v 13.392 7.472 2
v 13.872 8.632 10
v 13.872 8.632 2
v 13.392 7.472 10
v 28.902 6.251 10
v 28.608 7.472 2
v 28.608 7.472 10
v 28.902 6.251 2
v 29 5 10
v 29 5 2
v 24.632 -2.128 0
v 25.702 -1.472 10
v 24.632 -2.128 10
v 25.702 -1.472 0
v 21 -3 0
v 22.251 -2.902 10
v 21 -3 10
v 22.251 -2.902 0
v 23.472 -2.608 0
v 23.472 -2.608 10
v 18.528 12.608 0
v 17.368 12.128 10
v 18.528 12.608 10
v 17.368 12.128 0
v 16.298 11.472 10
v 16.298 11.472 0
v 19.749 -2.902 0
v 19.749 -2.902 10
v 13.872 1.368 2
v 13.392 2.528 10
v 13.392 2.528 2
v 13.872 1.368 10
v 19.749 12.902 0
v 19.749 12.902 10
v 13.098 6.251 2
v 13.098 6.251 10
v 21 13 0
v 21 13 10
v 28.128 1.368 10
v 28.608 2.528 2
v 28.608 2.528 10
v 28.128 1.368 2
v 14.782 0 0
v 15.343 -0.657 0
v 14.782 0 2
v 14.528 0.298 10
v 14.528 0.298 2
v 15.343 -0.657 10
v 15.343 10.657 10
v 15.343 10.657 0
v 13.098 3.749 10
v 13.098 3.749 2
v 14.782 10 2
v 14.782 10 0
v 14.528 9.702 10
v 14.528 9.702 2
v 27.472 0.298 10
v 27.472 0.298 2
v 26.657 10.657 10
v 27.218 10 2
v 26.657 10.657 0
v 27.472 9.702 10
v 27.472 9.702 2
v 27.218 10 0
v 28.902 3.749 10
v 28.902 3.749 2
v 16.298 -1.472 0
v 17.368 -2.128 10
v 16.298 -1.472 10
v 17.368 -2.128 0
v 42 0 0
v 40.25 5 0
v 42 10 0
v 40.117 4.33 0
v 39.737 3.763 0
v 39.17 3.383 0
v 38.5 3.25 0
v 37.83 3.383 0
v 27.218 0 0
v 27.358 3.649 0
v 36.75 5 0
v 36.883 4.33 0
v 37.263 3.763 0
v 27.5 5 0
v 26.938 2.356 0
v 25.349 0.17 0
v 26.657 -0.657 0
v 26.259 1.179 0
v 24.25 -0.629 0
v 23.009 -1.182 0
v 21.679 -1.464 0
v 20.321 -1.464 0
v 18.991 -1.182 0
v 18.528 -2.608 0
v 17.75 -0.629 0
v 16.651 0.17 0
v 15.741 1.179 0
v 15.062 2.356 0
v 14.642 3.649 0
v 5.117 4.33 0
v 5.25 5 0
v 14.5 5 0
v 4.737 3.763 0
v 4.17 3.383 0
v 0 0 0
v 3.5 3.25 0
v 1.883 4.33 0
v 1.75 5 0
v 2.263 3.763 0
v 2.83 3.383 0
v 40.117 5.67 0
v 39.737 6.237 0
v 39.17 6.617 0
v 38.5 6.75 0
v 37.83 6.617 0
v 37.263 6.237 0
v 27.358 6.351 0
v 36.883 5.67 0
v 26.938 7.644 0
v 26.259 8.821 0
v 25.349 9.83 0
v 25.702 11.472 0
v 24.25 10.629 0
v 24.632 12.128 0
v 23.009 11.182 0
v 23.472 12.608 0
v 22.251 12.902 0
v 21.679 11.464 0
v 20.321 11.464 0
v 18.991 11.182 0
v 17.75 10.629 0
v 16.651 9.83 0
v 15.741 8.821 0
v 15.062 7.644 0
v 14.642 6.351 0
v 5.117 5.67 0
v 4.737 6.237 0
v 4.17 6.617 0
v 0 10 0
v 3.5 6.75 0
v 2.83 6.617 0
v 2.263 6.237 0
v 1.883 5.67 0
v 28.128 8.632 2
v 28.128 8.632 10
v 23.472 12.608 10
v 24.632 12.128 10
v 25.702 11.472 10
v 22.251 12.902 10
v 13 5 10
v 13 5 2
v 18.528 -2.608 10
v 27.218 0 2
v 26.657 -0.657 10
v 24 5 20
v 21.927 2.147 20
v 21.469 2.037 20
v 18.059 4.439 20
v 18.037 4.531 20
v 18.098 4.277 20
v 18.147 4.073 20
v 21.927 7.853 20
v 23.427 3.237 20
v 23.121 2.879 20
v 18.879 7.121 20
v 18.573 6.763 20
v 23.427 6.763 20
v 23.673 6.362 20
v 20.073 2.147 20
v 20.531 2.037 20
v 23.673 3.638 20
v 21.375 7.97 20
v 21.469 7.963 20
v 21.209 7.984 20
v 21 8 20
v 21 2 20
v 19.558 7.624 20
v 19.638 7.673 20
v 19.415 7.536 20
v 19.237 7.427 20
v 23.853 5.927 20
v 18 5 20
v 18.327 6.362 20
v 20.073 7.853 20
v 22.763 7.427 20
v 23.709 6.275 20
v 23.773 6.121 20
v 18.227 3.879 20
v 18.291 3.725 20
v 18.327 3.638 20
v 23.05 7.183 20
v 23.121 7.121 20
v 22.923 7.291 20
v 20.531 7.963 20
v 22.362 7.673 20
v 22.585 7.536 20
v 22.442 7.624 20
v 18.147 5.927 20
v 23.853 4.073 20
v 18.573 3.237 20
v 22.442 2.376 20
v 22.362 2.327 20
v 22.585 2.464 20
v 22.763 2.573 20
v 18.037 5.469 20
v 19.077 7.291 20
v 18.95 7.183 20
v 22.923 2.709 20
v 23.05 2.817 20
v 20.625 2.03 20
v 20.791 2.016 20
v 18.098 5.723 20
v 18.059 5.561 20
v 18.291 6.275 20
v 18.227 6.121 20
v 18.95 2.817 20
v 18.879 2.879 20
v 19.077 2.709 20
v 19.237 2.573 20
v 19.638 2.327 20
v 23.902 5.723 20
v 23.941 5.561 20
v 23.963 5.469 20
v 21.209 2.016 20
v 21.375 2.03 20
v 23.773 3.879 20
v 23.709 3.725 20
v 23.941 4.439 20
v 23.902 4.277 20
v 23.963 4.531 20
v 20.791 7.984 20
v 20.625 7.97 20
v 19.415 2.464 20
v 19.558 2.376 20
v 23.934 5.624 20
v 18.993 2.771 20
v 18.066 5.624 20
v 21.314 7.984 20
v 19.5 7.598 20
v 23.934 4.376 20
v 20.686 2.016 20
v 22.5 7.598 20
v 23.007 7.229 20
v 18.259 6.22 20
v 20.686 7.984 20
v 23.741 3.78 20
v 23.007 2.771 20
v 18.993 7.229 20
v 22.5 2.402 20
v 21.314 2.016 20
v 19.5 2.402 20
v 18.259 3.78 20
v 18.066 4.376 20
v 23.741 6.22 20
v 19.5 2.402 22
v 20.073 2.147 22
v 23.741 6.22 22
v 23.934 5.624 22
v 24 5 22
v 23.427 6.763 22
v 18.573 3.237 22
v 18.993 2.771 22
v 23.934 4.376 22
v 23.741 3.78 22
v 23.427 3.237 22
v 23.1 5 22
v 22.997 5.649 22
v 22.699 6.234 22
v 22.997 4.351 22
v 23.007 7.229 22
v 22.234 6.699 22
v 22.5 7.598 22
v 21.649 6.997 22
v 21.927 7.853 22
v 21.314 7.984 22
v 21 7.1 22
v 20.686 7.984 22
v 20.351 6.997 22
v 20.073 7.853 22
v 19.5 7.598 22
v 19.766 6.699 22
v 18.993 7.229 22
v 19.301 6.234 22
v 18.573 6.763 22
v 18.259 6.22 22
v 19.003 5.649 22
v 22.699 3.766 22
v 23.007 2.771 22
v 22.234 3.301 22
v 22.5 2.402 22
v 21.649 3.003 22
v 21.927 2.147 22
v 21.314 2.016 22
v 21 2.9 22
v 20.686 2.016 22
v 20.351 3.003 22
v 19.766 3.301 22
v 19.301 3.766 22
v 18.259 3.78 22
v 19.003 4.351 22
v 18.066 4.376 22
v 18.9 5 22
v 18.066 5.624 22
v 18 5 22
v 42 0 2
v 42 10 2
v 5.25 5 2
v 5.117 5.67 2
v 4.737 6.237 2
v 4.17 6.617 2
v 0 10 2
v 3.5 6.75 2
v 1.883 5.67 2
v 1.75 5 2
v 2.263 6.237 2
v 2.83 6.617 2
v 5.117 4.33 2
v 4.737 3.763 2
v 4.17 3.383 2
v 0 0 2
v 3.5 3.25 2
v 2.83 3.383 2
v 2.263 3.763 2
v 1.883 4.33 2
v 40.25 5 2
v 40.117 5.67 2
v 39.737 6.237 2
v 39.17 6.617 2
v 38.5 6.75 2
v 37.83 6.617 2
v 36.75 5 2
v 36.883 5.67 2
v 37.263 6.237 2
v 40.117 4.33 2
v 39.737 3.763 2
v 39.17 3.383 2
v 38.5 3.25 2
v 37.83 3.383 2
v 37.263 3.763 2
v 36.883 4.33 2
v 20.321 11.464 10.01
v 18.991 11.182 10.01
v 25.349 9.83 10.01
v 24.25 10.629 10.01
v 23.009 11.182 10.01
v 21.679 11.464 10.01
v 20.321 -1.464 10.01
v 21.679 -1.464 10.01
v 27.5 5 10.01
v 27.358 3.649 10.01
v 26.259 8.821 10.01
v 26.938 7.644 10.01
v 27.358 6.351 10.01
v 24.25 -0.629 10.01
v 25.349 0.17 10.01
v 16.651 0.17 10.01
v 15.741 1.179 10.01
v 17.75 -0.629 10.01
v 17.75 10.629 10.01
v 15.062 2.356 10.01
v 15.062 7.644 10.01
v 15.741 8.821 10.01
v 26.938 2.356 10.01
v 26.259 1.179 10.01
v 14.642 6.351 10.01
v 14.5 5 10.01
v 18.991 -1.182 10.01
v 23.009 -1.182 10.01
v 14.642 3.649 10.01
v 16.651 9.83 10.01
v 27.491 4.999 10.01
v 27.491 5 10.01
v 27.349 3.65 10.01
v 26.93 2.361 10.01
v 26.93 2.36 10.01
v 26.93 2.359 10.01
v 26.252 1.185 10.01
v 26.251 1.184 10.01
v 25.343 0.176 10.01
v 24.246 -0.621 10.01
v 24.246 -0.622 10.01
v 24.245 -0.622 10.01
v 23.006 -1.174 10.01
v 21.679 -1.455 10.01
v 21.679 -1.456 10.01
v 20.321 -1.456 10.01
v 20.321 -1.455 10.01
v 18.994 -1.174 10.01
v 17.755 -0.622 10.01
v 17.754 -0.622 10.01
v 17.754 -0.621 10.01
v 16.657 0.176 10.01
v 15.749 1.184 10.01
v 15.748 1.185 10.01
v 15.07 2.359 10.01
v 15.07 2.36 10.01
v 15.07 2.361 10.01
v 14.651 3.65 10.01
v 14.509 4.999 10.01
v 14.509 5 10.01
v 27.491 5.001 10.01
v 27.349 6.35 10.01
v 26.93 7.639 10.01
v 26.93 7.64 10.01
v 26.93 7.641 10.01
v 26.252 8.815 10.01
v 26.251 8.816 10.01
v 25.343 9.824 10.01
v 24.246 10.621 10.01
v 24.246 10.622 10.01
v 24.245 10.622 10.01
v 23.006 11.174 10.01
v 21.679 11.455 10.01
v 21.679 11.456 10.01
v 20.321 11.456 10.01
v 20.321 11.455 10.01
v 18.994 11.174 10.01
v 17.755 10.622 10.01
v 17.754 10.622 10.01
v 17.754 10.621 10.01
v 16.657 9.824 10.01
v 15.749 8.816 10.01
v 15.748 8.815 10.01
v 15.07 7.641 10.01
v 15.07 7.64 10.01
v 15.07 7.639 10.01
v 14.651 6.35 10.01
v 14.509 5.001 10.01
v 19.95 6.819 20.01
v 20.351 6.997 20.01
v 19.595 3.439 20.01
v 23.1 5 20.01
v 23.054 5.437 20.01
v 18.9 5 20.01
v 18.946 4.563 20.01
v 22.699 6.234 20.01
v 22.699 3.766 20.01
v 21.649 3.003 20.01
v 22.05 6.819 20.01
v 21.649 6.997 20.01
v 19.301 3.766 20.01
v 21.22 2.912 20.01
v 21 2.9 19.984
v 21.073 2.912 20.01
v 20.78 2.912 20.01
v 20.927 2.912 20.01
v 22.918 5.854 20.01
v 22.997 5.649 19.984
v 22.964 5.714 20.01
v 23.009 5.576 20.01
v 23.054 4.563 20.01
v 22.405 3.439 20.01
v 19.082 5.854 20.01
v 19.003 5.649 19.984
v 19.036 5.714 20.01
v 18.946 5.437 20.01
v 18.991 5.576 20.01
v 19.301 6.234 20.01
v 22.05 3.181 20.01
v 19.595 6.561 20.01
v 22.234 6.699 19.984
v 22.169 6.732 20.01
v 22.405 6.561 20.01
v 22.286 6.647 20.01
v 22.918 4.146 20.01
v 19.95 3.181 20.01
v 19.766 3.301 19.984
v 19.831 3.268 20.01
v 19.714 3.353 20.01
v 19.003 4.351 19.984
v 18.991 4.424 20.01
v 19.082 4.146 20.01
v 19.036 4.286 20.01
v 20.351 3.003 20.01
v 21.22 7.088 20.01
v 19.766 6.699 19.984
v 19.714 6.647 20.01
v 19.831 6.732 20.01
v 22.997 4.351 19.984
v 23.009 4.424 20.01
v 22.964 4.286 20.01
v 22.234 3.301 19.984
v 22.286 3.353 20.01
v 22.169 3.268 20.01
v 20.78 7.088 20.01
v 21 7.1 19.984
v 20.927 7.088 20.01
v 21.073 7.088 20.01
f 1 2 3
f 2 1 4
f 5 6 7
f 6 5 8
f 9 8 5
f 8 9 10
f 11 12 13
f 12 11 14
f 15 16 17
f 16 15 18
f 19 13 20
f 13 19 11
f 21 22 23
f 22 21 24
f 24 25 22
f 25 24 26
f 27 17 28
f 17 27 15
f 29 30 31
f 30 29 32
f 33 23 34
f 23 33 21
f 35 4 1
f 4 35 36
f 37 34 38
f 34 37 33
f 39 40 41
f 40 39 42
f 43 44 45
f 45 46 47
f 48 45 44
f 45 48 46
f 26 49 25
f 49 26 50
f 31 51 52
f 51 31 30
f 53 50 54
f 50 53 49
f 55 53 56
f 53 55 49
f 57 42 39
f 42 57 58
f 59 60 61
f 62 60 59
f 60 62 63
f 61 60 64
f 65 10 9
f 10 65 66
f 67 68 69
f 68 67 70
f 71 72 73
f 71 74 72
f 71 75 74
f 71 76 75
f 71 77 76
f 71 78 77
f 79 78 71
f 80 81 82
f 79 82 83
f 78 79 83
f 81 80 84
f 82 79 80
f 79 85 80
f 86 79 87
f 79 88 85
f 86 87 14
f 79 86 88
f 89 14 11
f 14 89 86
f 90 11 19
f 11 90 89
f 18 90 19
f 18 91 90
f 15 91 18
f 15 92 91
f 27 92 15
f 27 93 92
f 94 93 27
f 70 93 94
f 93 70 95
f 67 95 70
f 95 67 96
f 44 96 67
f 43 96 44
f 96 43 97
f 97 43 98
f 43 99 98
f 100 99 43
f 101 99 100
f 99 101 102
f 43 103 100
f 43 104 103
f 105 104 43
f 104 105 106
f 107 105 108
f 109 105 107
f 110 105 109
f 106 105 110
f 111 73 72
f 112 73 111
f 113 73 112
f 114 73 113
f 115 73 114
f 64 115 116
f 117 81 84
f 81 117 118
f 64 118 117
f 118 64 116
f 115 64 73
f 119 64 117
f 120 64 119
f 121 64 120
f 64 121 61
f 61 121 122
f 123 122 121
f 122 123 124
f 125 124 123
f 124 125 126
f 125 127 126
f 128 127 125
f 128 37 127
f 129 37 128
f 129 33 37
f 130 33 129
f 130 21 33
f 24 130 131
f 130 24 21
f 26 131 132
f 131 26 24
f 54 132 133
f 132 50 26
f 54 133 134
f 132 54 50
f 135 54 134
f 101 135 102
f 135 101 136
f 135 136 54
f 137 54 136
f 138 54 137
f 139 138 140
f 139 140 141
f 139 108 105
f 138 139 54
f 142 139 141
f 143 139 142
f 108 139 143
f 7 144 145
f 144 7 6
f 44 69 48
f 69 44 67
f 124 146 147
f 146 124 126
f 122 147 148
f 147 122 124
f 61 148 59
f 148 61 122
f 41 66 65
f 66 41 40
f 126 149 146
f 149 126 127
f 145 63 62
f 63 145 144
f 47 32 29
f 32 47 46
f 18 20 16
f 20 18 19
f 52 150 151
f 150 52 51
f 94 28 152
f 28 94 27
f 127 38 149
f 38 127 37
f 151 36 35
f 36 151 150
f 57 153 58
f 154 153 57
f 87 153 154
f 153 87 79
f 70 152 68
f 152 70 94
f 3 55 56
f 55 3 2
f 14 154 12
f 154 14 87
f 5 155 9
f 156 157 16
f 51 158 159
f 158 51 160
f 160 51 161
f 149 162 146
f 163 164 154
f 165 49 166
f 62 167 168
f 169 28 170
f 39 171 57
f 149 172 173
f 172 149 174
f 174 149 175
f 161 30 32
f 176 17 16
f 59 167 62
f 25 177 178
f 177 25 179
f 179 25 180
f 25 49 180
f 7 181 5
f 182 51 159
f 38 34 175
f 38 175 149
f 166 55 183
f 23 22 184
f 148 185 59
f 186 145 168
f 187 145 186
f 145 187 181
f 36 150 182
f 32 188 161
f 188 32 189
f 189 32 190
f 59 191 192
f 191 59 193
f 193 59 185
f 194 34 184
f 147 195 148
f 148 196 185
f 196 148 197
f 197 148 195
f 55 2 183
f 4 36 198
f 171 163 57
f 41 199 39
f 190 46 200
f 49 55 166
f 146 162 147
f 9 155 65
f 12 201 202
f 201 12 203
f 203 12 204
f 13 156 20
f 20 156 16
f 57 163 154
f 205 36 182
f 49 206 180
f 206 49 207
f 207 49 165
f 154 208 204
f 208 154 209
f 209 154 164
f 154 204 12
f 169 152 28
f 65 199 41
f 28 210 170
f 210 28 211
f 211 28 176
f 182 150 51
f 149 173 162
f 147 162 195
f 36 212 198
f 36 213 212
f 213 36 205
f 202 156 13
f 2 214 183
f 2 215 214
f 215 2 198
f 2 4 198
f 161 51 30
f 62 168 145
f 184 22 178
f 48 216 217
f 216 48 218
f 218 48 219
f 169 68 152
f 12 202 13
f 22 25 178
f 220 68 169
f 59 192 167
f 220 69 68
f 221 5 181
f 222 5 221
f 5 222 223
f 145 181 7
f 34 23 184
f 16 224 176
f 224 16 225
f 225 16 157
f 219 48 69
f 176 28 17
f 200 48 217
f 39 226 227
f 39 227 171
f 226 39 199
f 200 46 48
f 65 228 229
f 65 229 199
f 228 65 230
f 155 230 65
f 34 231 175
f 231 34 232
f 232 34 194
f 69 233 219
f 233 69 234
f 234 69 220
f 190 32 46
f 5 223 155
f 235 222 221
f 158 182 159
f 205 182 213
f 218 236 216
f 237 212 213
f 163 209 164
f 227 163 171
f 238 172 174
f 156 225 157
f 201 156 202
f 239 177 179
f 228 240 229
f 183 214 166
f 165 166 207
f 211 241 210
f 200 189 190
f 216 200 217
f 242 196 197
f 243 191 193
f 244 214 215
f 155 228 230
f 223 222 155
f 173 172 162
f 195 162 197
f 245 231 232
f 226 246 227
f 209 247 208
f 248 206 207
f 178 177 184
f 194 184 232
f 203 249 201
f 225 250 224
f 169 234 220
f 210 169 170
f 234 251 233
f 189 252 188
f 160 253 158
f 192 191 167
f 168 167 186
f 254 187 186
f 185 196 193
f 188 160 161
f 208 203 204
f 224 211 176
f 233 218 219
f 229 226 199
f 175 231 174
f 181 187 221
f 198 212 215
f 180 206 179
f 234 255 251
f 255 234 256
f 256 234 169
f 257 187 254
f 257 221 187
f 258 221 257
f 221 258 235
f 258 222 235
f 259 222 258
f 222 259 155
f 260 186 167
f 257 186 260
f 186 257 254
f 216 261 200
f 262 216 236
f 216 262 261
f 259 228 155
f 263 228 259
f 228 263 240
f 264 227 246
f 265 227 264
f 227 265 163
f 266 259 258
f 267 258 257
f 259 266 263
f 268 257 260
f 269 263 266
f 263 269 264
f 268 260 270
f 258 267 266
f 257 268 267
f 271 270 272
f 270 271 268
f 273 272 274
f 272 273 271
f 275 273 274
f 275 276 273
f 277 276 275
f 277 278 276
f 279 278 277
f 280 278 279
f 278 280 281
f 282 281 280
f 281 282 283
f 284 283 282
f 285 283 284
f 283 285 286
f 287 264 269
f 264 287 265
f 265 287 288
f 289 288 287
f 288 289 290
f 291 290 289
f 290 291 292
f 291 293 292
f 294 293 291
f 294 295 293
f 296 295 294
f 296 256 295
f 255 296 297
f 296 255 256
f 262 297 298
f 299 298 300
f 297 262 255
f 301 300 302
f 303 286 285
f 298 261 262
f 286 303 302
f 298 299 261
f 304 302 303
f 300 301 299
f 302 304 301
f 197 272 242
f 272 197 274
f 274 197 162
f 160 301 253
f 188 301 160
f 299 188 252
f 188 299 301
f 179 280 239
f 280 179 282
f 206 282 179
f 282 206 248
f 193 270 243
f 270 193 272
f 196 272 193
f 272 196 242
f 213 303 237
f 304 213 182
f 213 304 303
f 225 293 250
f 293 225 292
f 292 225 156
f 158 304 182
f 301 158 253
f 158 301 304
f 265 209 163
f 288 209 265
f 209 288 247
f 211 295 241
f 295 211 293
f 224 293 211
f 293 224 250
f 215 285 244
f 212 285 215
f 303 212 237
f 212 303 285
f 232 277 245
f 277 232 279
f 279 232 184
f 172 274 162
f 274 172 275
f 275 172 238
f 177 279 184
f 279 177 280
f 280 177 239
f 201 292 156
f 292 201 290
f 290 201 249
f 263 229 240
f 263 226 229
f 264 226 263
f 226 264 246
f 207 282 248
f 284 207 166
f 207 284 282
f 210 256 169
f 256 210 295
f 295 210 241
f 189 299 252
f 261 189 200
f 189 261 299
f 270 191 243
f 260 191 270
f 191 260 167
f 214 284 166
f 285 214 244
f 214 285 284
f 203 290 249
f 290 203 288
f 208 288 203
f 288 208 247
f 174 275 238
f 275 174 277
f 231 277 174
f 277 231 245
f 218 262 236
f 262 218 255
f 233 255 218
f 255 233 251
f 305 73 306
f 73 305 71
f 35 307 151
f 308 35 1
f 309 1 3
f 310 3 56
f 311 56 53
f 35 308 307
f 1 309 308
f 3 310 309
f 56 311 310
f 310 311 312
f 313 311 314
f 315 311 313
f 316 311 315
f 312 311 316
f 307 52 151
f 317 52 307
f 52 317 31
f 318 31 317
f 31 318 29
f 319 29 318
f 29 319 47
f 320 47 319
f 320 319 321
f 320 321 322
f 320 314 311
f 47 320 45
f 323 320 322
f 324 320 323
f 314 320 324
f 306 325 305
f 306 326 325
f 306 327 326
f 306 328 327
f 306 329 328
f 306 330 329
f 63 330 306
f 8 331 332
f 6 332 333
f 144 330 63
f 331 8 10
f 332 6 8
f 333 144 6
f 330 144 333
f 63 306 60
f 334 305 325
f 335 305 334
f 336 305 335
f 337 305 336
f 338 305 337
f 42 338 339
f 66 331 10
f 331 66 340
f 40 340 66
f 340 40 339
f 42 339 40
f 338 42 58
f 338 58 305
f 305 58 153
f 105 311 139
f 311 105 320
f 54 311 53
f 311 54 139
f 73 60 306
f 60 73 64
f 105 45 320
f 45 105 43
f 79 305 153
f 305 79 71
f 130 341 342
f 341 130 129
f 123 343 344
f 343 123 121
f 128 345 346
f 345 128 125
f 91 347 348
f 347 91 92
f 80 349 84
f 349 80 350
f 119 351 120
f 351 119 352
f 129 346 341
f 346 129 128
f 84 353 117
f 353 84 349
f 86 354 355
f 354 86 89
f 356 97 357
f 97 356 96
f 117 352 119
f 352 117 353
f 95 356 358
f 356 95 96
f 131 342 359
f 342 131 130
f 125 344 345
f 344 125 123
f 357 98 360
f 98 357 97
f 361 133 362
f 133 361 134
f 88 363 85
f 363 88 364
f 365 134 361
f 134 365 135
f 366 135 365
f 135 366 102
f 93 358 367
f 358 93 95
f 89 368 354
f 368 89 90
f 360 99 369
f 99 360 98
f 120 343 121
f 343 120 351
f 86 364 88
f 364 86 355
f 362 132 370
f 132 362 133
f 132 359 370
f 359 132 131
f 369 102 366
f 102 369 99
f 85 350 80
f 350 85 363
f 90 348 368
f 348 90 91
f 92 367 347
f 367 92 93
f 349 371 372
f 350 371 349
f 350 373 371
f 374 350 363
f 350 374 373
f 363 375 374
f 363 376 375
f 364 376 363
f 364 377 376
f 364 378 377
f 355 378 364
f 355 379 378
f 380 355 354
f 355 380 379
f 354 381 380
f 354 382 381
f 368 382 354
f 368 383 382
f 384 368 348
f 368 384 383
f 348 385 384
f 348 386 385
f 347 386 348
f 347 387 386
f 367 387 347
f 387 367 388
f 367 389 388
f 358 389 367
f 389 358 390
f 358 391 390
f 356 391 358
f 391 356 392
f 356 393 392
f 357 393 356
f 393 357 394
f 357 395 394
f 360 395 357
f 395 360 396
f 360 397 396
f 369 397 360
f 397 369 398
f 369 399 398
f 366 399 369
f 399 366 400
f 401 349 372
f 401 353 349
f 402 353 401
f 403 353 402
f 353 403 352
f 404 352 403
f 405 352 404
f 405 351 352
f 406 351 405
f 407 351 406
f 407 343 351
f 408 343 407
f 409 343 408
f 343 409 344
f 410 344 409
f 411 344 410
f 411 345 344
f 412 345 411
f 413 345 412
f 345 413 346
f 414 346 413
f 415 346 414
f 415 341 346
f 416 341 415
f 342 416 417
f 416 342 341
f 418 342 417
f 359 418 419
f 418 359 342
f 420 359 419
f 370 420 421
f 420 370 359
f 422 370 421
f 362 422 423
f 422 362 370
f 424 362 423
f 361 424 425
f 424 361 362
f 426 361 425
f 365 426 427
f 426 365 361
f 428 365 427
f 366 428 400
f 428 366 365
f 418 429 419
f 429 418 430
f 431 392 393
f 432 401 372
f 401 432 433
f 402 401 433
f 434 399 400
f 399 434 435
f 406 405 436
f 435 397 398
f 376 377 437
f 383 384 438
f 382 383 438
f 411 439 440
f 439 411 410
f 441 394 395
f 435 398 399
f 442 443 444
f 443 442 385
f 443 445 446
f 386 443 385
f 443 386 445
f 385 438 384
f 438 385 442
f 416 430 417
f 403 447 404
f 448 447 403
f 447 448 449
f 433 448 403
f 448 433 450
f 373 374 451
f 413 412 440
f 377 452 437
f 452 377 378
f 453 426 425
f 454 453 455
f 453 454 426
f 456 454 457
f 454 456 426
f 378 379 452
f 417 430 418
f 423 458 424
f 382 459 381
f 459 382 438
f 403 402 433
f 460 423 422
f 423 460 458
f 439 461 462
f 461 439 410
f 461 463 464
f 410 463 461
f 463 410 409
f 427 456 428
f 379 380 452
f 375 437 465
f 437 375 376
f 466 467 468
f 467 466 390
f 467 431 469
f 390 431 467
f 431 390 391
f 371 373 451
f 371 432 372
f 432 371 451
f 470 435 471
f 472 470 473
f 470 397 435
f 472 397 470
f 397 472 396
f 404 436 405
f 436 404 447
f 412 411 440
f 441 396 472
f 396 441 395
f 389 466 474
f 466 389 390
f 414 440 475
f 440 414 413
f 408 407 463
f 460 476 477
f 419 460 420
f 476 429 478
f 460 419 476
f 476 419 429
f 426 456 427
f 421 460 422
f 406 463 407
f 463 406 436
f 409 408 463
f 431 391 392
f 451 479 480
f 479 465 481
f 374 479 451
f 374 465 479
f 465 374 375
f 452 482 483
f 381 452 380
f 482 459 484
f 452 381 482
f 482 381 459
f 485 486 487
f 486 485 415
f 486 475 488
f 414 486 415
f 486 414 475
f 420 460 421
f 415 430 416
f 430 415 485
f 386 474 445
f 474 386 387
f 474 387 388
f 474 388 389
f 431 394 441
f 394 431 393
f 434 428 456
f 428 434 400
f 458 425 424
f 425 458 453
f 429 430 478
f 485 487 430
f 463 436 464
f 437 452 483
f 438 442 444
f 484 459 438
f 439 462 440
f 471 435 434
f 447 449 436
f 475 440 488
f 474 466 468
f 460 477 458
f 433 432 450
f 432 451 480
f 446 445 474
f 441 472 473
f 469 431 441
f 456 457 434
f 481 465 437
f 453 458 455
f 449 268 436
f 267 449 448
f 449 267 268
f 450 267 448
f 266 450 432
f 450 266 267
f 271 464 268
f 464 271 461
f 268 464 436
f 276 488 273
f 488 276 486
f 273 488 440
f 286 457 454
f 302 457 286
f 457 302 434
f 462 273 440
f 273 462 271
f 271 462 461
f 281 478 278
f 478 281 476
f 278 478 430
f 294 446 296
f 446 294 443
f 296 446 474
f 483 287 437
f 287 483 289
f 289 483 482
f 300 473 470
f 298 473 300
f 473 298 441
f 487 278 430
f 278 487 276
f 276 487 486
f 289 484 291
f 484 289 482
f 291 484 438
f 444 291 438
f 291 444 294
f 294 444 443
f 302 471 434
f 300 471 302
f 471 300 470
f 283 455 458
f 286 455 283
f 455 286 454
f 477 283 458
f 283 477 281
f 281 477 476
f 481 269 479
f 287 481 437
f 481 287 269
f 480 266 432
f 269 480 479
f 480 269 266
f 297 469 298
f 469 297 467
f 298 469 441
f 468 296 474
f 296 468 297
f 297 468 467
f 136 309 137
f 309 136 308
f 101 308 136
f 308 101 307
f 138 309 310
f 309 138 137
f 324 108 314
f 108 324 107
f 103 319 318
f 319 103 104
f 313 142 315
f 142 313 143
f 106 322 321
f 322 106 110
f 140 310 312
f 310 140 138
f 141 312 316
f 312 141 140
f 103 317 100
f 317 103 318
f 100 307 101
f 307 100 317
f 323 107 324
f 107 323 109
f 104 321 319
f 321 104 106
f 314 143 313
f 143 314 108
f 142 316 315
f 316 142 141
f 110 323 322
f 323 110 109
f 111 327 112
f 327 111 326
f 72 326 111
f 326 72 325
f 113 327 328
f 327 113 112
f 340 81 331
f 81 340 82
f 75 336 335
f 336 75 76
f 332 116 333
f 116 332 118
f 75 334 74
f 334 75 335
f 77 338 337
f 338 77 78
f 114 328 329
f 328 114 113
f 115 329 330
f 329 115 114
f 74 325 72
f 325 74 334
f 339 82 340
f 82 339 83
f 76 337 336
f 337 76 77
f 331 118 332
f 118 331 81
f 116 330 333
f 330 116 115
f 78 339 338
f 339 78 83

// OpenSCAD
tw=42;
th=10;
bd=2;
td=10;
bbd=16;
bld=13;
difference(){
  union(){
    cube([tw,th,bd]);
    translate([tw/2,th/2,0]) {
      cylinder(d=bbd,h=td,$fn=40);
      translate([0,0,td]) cylinder(d1=bbd,d2=6,h=bbd-6,$fn=40);
      translate([0,0,td+bbd-6]) cylinder(d=6,h=2,$fn=30);
    }
  }
  translate([tw/2,th/2,-.01]) {
    cylinder(d=bld,h=td+.02,$fn=30);
    translate([0,0,td]) cylinder(d1=bld,d2=4.2,h=bbd-5.98,$fn=30);
    cylinder(d=4.2,h=40,$fn=20);
  }
  translate([tw/2-17.5,th/2,-.01]) cylinder(d=3.5,h=bd+.02,$fn=16);
  translate([tw/2+17.5,th/2,-.01]) cylinder(d=3.5,h=bd+.02,$fn=16);
}
